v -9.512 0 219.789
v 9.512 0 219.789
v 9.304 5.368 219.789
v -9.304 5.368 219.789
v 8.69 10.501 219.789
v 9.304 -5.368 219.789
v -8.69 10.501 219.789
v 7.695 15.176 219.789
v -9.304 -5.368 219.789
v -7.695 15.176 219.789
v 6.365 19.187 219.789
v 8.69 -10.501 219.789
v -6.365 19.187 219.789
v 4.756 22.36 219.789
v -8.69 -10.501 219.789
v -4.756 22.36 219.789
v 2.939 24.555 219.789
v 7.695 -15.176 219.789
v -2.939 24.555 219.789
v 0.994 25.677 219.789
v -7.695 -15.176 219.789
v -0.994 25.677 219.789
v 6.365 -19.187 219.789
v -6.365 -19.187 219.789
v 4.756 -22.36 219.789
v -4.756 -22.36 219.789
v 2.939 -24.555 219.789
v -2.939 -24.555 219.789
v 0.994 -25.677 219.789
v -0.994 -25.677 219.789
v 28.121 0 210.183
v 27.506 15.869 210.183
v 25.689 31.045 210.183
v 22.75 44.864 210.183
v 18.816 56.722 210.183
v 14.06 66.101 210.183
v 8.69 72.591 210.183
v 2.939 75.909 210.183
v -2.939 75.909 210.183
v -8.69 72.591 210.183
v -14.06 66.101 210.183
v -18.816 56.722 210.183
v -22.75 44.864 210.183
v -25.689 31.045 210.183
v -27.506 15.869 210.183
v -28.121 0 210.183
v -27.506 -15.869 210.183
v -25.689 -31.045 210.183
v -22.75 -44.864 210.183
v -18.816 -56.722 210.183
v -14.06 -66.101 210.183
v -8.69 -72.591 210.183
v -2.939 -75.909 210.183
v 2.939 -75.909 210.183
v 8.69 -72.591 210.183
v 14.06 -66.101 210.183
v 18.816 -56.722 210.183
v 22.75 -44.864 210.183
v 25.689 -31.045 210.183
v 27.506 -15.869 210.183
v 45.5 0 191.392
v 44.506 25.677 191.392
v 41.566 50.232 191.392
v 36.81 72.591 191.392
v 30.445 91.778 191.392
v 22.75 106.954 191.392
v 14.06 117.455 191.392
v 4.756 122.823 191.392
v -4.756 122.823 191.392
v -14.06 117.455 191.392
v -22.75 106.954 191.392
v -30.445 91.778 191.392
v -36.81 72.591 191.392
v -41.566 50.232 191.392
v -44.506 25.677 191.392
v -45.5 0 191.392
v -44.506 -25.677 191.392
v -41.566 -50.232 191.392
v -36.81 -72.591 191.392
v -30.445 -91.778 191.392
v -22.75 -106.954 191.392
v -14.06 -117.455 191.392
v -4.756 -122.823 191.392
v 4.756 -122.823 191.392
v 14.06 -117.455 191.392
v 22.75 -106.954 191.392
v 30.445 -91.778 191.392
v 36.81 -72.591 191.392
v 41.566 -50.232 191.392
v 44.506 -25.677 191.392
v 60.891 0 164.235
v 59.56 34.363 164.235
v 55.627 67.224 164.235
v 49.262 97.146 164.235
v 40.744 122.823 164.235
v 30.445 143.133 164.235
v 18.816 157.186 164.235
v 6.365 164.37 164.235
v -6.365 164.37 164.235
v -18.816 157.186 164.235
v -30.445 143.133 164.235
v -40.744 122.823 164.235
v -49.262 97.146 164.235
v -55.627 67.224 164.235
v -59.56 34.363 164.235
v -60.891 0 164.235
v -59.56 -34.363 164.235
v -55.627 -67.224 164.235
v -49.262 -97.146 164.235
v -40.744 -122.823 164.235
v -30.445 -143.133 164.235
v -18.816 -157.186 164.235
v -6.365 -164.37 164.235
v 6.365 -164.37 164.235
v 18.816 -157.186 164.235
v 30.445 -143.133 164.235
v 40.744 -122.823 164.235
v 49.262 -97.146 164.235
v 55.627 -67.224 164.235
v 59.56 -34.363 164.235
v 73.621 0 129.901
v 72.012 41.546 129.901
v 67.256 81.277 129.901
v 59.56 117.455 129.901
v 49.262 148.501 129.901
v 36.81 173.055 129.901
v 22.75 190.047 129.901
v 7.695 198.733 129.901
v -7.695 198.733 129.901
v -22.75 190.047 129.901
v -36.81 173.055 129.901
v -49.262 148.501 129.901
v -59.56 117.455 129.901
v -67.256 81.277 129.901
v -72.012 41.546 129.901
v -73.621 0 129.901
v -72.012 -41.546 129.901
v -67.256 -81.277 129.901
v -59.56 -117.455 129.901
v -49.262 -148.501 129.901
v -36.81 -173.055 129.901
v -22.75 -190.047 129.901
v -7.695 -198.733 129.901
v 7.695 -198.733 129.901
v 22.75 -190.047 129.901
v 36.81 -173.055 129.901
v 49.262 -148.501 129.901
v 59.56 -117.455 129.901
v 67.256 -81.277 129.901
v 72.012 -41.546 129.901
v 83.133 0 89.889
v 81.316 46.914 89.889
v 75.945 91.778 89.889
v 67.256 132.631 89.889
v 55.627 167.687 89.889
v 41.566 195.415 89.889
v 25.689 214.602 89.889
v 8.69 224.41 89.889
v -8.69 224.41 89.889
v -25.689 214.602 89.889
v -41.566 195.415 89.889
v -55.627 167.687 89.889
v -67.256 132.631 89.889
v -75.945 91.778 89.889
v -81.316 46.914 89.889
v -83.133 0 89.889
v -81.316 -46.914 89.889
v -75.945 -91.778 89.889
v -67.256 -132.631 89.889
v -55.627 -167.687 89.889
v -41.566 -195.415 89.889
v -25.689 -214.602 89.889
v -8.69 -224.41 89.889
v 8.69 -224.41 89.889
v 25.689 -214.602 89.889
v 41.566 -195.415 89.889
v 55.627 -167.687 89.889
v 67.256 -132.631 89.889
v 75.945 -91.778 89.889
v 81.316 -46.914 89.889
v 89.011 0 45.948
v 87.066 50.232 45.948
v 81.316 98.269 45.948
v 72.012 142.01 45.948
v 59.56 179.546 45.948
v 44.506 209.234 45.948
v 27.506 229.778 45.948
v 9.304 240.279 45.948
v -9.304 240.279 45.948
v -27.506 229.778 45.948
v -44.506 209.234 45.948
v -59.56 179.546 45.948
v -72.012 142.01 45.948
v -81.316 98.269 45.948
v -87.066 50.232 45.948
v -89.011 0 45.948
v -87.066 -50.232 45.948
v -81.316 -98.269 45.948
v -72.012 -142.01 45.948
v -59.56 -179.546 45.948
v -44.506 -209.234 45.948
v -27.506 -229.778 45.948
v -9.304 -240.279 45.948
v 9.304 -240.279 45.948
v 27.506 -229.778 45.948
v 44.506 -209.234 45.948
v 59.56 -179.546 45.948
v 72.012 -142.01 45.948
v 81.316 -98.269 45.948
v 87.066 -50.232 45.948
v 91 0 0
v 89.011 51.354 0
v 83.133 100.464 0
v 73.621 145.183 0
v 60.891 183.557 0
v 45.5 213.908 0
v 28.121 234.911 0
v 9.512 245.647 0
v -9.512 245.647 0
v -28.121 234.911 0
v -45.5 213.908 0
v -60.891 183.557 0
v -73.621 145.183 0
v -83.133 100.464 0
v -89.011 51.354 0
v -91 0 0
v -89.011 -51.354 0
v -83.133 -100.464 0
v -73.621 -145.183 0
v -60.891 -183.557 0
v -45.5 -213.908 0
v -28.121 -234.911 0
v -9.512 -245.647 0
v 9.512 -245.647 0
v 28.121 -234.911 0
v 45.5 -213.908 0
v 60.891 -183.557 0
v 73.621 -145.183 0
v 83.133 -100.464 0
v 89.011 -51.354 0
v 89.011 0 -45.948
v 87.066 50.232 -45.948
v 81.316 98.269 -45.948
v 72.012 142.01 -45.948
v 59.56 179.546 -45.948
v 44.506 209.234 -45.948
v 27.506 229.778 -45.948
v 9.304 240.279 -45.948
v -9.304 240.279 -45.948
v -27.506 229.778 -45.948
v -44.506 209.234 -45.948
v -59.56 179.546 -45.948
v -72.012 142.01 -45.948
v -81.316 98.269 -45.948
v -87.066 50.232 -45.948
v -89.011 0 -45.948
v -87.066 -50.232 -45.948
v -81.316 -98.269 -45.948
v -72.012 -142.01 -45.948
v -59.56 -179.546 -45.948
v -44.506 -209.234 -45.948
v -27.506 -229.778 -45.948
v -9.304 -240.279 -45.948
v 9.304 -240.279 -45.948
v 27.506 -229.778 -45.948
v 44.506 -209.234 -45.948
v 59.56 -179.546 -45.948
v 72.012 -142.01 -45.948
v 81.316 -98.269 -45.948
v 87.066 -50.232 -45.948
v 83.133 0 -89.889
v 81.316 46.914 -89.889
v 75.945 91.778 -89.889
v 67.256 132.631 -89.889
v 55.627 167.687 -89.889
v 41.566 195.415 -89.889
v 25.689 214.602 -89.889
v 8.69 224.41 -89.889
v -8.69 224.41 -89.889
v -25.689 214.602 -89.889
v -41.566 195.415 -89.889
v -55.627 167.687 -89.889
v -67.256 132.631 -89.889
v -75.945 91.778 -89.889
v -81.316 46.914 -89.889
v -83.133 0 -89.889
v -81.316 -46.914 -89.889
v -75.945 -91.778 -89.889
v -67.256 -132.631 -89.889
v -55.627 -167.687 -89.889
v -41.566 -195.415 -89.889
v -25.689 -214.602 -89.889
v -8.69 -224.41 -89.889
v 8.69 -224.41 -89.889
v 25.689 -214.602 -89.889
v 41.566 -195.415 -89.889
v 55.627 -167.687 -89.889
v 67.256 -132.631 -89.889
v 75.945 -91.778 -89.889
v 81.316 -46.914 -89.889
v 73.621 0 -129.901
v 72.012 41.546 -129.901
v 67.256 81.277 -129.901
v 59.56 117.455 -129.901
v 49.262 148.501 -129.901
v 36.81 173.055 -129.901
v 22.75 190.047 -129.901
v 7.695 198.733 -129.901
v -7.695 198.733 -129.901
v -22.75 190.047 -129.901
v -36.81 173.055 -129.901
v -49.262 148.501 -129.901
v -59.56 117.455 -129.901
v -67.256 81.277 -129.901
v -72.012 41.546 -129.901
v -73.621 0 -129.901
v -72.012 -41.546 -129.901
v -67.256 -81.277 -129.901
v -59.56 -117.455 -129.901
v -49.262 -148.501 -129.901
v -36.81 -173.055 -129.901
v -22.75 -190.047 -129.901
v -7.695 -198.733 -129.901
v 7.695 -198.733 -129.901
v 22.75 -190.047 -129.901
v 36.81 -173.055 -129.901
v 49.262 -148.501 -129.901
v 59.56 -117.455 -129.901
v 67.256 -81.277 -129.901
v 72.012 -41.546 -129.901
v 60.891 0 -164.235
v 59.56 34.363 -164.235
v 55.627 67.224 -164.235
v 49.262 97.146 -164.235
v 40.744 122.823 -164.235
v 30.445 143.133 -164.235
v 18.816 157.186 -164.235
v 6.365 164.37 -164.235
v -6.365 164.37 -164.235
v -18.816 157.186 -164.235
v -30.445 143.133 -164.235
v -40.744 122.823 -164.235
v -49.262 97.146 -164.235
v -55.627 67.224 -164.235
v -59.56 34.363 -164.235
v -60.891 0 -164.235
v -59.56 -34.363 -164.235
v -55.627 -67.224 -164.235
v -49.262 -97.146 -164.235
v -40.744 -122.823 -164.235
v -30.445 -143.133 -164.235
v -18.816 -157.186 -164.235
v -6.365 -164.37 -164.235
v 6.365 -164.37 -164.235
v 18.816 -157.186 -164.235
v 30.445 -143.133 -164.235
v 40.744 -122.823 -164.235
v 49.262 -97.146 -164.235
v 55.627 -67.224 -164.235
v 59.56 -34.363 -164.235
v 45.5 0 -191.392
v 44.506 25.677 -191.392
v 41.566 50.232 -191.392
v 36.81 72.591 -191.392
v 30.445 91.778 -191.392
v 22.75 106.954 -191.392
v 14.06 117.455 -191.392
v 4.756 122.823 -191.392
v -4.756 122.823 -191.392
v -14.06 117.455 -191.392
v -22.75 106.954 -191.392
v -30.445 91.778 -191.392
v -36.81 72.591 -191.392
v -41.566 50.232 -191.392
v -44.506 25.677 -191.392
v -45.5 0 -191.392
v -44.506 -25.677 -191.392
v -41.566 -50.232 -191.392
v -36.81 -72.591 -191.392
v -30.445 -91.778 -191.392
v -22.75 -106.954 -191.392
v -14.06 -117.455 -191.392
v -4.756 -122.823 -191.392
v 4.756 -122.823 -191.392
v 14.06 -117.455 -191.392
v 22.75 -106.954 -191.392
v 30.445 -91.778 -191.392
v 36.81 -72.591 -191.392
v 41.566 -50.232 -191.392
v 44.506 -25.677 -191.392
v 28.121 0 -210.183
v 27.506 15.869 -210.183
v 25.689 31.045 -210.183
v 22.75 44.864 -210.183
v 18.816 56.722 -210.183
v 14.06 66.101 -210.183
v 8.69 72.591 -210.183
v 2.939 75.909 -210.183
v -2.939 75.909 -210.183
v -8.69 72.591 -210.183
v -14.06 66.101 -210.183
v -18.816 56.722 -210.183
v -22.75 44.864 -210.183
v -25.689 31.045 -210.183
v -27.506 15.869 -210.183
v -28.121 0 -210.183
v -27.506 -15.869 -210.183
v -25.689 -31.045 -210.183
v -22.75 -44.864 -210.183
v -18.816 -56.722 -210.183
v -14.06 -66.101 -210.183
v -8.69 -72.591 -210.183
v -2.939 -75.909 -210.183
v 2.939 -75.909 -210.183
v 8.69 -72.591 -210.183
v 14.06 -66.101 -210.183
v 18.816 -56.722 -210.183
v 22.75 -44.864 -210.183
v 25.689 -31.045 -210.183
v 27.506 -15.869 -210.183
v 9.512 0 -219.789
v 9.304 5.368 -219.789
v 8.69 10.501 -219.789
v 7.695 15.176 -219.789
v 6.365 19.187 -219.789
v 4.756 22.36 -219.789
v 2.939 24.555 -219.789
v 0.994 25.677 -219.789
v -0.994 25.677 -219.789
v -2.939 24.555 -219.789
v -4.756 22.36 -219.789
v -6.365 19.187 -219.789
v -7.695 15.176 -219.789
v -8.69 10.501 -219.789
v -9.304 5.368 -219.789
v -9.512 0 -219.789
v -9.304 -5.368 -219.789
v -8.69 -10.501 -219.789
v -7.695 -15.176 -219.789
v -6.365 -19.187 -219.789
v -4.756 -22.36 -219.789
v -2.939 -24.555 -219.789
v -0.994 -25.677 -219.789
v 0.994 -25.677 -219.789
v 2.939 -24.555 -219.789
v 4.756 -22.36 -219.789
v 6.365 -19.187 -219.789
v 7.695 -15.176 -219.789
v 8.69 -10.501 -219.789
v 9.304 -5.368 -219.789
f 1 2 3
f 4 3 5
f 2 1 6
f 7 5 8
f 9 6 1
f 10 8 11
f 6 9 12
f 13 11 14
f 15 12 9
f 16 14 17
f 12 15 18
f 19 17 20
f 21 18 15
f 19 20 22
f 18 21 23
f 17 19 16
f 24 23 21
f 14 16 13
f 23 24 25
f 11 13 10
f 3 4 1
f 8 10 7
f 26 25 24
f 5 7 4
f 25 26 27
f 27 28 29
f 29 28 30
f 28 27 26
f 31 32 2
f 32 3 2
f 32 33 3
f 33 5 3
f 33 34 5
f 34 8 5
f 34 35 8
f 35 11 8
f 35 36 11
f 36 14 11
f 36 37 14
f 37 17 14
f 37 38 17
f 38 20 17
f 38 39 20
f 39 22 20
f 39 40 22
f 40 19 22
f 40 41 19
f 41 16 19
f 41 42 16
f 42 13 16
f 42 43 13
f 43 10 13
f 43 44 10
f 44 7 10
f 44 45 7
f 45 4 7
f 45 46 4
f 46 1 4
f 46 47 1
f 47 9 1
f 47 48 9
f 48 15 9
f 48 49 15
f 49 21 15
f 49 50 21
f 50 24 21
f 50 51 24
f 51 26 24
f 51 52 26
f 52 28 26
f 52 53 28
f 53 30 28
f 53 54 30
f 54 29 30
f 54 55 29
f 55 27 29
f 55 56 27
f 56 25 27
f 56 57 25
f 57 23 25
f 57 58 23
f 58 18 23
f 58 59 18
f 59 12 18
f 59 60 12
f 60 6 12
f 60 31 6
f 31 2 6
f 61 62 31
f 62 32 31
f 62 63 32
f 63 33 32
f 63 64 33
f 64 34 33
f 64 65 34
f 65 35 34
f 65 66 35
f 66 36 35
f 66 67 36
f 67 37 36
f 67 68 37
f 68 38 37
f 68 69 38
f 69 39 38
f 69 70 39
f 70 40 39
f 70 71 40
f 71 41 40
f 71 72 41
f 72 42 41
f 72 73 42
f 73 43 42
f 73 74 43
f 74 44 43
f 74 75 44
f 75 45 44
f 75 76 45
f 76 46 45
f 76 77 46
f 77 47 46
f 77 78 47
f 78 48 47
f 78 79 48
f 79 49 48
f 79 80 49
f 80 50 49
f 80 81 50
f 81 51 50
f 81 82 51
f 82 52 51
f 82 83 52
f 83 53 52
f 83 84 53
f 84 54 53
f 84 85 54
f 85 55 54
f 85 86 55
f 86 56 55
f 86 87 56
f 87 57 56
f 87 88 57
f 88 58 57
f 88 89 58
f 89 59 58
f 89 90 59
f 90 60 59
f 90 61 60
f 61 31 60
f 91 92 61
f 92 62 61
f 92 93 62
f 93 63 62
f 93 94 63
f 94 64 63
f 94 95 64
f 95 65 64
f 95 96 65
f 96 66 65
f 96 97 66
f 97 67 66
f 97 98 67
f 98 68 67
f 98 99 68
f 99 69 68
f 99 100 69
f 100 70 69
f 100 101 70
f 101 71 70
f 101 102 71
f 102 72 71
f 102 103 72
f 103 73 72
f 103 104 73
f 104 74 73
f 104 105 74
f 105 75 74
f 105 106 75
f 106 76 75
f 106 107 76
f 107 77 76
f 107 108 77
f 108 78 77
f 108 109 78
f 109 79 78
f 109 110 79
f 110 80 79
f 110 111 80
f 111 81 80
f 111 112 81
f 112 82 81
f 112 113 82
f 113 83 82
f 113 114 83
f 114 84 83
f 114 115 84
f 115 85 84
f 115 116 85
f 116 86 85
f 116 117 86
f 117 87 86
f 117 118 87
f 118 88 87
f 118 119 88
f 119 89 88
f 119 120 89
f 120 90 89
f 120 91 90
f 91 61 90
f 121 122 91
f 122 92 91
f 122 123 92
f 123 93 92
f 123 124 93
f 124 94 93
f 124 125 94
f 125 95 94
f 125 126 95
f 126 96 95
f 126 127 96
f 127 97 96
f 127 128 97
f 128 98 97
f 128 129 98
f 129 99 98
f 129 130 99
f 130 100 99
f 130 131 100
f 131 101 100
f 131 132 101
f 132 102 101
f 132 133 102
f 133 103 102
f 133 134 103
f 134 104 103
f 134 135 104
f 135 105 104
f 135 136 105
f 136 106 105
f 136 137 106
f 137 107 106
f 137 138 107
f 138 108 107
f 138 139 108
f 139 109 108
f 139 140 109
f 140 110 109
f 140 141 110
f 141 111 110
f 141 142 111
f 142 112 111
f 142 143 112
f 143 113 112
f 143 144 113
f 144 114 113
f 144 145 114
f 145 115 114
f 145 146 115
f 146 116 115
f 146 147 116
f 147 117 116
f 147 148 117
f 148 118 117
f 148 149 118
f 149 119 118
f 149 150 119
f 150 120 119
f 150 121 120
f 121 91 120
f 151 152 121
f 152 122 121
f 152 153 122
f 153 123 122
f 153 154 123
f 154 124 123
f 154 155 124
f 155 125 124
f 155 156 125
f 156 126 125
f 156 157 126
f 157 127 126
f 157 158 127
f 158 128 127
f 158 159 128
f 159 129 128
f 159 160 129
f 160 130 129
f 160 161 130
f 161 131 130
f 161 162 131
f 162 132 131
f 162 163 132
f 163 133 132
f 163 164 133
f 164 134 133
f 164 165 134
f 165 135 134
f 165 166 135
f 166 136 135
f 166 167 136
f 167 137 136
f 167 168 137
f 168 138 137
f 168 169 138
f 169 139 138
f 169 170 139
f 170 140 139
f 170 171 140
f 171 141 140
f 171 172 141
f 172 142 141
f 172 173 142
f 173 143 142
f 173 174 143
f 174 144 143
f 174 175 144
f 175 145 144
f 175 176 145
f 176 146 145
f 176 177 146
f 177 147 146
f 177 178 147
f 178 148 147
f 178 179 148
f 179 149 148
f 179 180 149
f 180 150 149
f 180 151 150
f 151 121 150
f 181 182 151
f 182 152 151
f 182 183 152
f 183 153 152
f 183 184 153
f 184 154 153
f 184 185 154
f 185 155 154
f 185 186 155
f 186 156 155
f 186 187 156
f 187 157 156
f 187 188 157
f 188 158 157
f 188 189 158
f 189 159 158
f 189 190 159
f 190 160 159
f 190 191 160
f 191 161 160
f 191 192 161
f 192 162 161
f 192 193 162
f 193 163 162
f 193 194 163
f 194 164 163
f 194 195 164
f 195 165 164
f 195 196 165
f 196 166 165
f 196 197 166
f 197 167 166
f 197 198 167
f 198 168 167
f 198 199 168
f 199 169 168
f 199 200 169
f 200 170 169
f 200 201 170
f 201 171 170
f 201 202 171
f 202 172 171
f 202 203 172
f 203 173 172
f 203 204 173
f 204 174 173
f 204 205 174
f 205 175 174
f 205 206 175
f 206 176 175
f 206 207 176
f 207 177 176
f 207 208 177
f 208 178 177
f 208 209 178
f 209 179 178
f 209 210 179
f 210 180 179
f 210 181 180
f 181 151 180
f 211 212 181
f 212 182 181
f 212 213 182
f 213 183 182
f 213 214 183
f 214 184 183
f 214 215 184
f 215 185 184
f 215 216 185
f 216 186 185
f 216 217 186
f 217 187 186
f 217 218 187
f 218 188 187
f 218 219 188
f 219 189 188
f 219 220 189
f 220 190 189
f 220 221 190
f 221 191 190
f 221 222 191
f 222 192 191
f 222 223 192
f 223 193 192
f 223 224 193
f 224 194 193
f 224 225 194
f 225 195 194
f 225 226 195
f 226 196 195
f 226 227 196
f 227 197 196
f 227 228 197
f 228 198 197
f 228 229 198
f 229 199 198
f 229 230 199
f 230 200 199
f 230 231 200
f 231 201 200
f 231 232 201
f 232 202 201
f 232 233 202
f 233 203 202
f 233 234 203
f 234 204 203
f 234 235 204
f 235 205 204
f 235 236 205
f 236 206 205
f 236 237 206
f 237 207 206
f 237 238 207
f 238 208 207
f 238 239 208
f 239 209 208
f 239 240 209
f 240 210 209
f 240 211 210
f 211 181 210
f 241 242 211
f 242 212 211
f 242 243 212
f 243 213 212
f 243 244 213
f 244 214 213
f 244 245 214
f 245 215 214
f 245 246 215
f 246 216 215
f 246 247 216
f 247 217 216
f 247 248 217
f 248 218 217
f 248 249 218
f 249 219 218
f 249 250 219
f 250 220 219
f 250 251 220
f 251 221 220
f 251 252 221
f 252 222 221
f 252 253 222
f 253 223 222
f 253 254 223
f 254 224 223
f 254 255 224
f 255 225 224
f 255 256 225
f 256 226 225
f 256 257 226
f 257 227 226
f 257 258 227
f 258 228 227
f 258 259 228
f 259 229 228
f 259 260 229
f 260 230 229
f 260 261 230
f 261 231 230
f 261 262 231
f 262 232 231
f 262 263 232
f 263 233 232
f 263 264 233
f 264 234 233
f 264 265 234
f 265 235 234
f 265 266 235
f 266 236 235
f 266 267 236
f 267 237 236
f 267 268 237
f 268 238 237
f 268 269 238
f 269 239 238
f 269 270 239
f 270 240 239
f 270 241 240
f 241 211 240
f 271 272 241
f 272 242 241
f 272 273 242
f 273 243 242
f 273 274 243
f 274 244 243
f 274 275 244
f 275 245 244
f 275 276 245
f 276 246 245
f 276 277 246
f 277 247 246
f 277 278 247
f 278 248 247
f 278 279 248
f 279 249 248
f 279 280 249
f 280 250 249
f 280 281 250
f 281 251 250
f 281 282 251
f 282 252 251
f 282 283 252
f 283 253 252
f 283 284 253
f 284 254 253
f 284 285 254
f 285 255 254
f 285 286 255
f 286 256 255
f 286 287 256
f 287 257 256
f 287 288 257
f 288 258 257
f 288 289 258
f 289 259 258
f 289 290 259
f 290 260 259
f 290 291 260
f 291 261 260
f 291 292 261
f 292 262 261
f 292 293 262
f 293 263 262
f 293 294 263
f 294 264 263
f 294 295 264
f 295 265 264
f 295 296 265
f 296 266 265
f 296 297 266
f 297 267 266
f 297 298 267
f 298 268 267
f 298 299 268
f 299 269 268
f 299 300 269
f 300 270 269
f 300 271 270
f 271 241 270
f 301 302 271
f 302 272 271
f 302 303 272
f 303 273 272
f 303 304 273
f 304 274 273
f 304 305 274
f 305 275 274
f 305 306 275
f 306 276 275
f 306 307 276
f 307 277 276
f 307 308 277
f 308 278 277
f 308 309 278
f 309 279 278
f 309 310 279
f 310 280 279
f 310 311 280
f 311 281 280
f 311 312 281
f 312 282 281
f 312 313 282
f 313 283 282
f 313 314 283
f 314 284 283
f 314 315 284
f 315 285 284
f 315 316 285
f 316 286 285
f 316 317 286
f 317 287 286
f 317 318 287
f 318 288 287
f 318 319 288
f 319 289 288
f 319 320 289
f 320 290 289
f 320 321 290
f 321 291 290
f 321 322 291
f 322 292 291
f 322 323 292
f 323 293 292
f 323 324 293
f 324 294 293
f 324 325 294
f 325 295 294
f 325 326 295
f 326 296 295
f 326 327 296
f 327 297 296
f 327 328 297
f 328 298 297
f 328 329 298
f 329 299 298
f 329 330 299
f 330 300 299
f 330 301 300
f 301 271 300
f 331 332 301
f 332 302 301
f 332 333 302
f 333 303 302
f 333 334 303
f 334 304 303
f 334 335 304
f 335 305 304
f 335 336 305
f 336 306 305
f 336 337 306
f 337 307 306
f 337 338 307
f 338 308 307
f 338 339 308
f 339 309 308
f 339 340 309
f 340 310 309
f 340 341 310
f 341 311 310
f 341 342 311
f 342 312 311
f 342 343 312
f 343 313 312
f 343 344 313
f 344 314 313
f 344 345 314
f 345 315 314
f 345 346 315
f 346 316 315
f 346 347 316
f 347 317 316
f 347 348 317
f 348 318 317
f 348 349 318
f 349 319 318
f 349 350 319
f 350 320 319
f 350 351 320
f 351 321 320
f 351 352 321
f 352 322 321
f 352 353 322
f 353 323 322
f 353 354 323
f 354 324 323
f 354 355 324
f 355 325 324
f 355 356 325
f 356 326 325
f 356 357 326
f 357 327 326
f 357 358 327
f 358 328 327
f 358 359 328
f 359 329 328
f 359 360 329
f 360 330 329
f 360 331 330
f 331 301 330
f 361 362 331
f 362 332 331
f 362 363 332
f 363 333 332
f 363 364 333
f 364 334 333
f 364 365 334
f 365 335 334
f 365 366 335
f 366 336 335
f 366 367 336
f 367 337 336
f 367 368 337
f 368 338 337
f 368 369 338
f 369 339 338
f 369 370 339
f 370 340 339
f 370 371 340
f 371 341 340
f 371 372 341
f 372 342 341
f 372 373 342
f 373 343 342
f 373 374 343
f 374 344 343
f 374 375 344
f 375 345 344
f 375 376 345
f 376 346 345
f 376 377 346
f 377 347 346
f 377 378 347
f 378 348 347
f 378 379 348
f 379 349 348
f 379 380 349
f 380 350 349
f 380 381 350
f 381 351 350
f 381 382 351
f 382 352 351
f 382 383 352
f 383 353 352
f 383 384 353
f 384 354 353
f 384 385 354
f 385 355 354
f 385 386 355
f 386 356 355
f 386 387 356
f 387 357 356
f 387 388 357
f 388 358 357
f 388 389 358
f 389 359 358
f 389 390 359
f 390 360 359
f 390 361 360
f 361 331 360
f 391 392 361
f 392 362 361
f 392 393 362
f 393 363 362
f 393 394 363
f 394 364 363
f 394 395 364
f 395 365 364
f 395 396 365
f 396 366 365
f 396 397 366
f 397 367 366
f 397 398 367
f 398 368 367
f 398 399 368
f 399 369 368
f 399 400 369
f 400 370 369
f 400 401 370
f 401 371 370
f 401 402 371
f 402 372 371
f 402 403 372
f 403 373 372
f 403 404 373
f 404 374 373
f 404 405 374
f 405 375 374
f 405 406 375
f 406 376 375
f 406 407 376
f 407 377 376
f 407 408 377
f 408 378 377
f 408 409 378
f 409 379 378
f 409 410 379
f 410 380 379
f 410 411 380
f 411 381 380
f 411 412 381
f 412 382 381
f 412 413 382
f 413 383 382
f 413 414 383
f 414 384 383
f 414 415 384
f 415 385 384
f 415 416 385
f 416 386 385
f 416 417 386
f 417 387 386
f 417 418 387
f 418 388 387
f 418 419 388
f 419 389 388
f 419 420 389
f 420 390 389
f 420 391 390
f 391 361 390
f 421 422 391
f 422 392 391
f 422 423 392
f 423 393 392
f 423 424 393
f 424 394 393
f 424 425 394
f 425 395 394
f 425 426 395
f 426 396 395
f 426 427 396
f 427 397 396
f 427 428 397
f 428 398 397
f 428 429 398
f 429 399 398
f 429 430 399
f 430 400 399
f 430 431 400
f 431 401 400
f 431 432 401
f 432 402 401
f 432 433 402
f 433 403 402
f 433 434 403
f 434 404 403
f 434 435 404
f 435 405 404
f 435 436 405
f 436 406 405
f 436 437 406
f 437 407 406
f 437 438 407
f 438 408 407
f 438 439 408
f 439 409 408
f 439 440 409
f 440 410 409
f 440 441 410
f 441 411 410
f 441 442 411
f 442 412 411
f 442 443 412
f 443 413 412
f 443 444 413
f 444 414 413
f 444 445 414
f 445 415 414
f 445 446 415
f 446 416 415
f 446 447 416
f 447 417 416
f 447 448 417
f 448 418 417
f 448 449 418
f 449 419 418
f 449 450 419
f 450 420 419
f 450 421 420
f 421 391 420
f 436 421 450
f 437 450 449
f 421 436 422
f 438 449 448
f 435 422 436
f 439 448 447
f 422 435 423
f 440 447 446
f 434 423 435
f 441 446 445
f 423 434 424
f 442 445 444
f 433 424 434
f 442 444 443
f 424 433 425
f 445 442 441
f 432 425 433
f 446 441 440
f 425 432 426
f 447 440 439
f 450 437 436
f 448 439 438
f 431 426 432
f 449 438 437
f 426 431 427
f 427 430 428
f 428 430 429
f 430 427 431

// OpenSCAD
// Generated by SolidPython 1.0.1 on 2020-07-29 00:46:48


scale(v = [7, 19, 17]) {
	sphere(r = 13);
}
/***********************************************
*********      SolidPython code:      **********
************************************************
 
# import packages: SolidPython
from solid import *
from solid.utils import *
from itertools import chain, combinations, permutations


class Resize:

    def __init__(self, scad_file):
        self.scad_file = scad_file
        #self.scad_file = import_scad(scad_file)
        # cone/cylinder param:
        self.r1 = 0
        self.r2 = 0
        self.h = 0
        # rectangular prism param:
        self.w = 0
        self.l = 0
        # ellipse param:
        self.r = 0

    # import OpenScad code (file name corresponds to shape)


    # classify shape + parameters
    def assign(self, param1, param2, param3):
        if self.scad_file == 'cone.scad':
            self.r1 = param1
            self.r2 = param2
            self.h = param3
        elif self.scad_file == 'cylinder.scad':
            self.r1 = param1
            self.r2 = param2
            self.h = param3
        elif self.scad_file == 'rectangularPrism.scad':
            self.h = param1
            self.l = param2
            self.w = param3
        else:
            self.r = param1
            self.h = param2

    # resize parameters
    def iterate(self):
        x = range(3, 20, 2)
        i = 1
        if self.scad_file == 'cone.scad':
            tempList = list(permutations(x, 2))
            for temp in tempList:
                param1 = temp[0]
                param2 = temp[1]
                filepath = 'produced_scad_files/' + 'cone' + str(param1) + '_' + str(param2) + '_' + '.scad'
                scad_render_to_file(cylinder(h=param1, r1=param2, r2=0), filepath)

        elif self.scad_file == 'cylinder.scad':
            tempList = list(permutations(x, 3))
            for temp in tempList:
                param1 = temp[0]
                param2 = temp[1]
                filepath = 'produced_scad_files/' + 'cylinder' + str(param1) + '_' + str(param2) + '_' + '.scad'
                scad_render_to_file(cylinder(h=param1, r1=param2, r2=param2), filepath)

        elif self.scad_file == 'rectangularPrism.scad':
            tempList = list(permutations(x, 3))
            for temp in tempList:
                param1 = temp[0]
                param2 = temp[1]
                param3 = temp[2]
                filepath = 'produced_scad_files/' + 'rectangularPrism' + str(param1) + '_' + str(param2) + '_' + str(
                    param3) + '.scad'
                scad_render_to_file(cube(size=(param1, param2, param3)), filepath)

        elif self.scad_file == 'ellipse.scad':
            tempList = list(permutations(x, 4))
            for temp in tempList:
                param1 = temp[0]
                param2 = temp[1]
                param3 = temp[2]
                param4 = temp[3]
                filepath = 'produced_scad_files/' + 'ellipse' + str(param1) + '_' + str(param2) + '_' + str(param3) + '_' + str(param4) + '.scad'
                scad_render_to_file(scale([param1, param2, param3])(sphere(r=param4)), filepath)

    def render_to_scadfile(self):
        scad_render_to_file(scad, 'example.scad') 
 
************************************************/
